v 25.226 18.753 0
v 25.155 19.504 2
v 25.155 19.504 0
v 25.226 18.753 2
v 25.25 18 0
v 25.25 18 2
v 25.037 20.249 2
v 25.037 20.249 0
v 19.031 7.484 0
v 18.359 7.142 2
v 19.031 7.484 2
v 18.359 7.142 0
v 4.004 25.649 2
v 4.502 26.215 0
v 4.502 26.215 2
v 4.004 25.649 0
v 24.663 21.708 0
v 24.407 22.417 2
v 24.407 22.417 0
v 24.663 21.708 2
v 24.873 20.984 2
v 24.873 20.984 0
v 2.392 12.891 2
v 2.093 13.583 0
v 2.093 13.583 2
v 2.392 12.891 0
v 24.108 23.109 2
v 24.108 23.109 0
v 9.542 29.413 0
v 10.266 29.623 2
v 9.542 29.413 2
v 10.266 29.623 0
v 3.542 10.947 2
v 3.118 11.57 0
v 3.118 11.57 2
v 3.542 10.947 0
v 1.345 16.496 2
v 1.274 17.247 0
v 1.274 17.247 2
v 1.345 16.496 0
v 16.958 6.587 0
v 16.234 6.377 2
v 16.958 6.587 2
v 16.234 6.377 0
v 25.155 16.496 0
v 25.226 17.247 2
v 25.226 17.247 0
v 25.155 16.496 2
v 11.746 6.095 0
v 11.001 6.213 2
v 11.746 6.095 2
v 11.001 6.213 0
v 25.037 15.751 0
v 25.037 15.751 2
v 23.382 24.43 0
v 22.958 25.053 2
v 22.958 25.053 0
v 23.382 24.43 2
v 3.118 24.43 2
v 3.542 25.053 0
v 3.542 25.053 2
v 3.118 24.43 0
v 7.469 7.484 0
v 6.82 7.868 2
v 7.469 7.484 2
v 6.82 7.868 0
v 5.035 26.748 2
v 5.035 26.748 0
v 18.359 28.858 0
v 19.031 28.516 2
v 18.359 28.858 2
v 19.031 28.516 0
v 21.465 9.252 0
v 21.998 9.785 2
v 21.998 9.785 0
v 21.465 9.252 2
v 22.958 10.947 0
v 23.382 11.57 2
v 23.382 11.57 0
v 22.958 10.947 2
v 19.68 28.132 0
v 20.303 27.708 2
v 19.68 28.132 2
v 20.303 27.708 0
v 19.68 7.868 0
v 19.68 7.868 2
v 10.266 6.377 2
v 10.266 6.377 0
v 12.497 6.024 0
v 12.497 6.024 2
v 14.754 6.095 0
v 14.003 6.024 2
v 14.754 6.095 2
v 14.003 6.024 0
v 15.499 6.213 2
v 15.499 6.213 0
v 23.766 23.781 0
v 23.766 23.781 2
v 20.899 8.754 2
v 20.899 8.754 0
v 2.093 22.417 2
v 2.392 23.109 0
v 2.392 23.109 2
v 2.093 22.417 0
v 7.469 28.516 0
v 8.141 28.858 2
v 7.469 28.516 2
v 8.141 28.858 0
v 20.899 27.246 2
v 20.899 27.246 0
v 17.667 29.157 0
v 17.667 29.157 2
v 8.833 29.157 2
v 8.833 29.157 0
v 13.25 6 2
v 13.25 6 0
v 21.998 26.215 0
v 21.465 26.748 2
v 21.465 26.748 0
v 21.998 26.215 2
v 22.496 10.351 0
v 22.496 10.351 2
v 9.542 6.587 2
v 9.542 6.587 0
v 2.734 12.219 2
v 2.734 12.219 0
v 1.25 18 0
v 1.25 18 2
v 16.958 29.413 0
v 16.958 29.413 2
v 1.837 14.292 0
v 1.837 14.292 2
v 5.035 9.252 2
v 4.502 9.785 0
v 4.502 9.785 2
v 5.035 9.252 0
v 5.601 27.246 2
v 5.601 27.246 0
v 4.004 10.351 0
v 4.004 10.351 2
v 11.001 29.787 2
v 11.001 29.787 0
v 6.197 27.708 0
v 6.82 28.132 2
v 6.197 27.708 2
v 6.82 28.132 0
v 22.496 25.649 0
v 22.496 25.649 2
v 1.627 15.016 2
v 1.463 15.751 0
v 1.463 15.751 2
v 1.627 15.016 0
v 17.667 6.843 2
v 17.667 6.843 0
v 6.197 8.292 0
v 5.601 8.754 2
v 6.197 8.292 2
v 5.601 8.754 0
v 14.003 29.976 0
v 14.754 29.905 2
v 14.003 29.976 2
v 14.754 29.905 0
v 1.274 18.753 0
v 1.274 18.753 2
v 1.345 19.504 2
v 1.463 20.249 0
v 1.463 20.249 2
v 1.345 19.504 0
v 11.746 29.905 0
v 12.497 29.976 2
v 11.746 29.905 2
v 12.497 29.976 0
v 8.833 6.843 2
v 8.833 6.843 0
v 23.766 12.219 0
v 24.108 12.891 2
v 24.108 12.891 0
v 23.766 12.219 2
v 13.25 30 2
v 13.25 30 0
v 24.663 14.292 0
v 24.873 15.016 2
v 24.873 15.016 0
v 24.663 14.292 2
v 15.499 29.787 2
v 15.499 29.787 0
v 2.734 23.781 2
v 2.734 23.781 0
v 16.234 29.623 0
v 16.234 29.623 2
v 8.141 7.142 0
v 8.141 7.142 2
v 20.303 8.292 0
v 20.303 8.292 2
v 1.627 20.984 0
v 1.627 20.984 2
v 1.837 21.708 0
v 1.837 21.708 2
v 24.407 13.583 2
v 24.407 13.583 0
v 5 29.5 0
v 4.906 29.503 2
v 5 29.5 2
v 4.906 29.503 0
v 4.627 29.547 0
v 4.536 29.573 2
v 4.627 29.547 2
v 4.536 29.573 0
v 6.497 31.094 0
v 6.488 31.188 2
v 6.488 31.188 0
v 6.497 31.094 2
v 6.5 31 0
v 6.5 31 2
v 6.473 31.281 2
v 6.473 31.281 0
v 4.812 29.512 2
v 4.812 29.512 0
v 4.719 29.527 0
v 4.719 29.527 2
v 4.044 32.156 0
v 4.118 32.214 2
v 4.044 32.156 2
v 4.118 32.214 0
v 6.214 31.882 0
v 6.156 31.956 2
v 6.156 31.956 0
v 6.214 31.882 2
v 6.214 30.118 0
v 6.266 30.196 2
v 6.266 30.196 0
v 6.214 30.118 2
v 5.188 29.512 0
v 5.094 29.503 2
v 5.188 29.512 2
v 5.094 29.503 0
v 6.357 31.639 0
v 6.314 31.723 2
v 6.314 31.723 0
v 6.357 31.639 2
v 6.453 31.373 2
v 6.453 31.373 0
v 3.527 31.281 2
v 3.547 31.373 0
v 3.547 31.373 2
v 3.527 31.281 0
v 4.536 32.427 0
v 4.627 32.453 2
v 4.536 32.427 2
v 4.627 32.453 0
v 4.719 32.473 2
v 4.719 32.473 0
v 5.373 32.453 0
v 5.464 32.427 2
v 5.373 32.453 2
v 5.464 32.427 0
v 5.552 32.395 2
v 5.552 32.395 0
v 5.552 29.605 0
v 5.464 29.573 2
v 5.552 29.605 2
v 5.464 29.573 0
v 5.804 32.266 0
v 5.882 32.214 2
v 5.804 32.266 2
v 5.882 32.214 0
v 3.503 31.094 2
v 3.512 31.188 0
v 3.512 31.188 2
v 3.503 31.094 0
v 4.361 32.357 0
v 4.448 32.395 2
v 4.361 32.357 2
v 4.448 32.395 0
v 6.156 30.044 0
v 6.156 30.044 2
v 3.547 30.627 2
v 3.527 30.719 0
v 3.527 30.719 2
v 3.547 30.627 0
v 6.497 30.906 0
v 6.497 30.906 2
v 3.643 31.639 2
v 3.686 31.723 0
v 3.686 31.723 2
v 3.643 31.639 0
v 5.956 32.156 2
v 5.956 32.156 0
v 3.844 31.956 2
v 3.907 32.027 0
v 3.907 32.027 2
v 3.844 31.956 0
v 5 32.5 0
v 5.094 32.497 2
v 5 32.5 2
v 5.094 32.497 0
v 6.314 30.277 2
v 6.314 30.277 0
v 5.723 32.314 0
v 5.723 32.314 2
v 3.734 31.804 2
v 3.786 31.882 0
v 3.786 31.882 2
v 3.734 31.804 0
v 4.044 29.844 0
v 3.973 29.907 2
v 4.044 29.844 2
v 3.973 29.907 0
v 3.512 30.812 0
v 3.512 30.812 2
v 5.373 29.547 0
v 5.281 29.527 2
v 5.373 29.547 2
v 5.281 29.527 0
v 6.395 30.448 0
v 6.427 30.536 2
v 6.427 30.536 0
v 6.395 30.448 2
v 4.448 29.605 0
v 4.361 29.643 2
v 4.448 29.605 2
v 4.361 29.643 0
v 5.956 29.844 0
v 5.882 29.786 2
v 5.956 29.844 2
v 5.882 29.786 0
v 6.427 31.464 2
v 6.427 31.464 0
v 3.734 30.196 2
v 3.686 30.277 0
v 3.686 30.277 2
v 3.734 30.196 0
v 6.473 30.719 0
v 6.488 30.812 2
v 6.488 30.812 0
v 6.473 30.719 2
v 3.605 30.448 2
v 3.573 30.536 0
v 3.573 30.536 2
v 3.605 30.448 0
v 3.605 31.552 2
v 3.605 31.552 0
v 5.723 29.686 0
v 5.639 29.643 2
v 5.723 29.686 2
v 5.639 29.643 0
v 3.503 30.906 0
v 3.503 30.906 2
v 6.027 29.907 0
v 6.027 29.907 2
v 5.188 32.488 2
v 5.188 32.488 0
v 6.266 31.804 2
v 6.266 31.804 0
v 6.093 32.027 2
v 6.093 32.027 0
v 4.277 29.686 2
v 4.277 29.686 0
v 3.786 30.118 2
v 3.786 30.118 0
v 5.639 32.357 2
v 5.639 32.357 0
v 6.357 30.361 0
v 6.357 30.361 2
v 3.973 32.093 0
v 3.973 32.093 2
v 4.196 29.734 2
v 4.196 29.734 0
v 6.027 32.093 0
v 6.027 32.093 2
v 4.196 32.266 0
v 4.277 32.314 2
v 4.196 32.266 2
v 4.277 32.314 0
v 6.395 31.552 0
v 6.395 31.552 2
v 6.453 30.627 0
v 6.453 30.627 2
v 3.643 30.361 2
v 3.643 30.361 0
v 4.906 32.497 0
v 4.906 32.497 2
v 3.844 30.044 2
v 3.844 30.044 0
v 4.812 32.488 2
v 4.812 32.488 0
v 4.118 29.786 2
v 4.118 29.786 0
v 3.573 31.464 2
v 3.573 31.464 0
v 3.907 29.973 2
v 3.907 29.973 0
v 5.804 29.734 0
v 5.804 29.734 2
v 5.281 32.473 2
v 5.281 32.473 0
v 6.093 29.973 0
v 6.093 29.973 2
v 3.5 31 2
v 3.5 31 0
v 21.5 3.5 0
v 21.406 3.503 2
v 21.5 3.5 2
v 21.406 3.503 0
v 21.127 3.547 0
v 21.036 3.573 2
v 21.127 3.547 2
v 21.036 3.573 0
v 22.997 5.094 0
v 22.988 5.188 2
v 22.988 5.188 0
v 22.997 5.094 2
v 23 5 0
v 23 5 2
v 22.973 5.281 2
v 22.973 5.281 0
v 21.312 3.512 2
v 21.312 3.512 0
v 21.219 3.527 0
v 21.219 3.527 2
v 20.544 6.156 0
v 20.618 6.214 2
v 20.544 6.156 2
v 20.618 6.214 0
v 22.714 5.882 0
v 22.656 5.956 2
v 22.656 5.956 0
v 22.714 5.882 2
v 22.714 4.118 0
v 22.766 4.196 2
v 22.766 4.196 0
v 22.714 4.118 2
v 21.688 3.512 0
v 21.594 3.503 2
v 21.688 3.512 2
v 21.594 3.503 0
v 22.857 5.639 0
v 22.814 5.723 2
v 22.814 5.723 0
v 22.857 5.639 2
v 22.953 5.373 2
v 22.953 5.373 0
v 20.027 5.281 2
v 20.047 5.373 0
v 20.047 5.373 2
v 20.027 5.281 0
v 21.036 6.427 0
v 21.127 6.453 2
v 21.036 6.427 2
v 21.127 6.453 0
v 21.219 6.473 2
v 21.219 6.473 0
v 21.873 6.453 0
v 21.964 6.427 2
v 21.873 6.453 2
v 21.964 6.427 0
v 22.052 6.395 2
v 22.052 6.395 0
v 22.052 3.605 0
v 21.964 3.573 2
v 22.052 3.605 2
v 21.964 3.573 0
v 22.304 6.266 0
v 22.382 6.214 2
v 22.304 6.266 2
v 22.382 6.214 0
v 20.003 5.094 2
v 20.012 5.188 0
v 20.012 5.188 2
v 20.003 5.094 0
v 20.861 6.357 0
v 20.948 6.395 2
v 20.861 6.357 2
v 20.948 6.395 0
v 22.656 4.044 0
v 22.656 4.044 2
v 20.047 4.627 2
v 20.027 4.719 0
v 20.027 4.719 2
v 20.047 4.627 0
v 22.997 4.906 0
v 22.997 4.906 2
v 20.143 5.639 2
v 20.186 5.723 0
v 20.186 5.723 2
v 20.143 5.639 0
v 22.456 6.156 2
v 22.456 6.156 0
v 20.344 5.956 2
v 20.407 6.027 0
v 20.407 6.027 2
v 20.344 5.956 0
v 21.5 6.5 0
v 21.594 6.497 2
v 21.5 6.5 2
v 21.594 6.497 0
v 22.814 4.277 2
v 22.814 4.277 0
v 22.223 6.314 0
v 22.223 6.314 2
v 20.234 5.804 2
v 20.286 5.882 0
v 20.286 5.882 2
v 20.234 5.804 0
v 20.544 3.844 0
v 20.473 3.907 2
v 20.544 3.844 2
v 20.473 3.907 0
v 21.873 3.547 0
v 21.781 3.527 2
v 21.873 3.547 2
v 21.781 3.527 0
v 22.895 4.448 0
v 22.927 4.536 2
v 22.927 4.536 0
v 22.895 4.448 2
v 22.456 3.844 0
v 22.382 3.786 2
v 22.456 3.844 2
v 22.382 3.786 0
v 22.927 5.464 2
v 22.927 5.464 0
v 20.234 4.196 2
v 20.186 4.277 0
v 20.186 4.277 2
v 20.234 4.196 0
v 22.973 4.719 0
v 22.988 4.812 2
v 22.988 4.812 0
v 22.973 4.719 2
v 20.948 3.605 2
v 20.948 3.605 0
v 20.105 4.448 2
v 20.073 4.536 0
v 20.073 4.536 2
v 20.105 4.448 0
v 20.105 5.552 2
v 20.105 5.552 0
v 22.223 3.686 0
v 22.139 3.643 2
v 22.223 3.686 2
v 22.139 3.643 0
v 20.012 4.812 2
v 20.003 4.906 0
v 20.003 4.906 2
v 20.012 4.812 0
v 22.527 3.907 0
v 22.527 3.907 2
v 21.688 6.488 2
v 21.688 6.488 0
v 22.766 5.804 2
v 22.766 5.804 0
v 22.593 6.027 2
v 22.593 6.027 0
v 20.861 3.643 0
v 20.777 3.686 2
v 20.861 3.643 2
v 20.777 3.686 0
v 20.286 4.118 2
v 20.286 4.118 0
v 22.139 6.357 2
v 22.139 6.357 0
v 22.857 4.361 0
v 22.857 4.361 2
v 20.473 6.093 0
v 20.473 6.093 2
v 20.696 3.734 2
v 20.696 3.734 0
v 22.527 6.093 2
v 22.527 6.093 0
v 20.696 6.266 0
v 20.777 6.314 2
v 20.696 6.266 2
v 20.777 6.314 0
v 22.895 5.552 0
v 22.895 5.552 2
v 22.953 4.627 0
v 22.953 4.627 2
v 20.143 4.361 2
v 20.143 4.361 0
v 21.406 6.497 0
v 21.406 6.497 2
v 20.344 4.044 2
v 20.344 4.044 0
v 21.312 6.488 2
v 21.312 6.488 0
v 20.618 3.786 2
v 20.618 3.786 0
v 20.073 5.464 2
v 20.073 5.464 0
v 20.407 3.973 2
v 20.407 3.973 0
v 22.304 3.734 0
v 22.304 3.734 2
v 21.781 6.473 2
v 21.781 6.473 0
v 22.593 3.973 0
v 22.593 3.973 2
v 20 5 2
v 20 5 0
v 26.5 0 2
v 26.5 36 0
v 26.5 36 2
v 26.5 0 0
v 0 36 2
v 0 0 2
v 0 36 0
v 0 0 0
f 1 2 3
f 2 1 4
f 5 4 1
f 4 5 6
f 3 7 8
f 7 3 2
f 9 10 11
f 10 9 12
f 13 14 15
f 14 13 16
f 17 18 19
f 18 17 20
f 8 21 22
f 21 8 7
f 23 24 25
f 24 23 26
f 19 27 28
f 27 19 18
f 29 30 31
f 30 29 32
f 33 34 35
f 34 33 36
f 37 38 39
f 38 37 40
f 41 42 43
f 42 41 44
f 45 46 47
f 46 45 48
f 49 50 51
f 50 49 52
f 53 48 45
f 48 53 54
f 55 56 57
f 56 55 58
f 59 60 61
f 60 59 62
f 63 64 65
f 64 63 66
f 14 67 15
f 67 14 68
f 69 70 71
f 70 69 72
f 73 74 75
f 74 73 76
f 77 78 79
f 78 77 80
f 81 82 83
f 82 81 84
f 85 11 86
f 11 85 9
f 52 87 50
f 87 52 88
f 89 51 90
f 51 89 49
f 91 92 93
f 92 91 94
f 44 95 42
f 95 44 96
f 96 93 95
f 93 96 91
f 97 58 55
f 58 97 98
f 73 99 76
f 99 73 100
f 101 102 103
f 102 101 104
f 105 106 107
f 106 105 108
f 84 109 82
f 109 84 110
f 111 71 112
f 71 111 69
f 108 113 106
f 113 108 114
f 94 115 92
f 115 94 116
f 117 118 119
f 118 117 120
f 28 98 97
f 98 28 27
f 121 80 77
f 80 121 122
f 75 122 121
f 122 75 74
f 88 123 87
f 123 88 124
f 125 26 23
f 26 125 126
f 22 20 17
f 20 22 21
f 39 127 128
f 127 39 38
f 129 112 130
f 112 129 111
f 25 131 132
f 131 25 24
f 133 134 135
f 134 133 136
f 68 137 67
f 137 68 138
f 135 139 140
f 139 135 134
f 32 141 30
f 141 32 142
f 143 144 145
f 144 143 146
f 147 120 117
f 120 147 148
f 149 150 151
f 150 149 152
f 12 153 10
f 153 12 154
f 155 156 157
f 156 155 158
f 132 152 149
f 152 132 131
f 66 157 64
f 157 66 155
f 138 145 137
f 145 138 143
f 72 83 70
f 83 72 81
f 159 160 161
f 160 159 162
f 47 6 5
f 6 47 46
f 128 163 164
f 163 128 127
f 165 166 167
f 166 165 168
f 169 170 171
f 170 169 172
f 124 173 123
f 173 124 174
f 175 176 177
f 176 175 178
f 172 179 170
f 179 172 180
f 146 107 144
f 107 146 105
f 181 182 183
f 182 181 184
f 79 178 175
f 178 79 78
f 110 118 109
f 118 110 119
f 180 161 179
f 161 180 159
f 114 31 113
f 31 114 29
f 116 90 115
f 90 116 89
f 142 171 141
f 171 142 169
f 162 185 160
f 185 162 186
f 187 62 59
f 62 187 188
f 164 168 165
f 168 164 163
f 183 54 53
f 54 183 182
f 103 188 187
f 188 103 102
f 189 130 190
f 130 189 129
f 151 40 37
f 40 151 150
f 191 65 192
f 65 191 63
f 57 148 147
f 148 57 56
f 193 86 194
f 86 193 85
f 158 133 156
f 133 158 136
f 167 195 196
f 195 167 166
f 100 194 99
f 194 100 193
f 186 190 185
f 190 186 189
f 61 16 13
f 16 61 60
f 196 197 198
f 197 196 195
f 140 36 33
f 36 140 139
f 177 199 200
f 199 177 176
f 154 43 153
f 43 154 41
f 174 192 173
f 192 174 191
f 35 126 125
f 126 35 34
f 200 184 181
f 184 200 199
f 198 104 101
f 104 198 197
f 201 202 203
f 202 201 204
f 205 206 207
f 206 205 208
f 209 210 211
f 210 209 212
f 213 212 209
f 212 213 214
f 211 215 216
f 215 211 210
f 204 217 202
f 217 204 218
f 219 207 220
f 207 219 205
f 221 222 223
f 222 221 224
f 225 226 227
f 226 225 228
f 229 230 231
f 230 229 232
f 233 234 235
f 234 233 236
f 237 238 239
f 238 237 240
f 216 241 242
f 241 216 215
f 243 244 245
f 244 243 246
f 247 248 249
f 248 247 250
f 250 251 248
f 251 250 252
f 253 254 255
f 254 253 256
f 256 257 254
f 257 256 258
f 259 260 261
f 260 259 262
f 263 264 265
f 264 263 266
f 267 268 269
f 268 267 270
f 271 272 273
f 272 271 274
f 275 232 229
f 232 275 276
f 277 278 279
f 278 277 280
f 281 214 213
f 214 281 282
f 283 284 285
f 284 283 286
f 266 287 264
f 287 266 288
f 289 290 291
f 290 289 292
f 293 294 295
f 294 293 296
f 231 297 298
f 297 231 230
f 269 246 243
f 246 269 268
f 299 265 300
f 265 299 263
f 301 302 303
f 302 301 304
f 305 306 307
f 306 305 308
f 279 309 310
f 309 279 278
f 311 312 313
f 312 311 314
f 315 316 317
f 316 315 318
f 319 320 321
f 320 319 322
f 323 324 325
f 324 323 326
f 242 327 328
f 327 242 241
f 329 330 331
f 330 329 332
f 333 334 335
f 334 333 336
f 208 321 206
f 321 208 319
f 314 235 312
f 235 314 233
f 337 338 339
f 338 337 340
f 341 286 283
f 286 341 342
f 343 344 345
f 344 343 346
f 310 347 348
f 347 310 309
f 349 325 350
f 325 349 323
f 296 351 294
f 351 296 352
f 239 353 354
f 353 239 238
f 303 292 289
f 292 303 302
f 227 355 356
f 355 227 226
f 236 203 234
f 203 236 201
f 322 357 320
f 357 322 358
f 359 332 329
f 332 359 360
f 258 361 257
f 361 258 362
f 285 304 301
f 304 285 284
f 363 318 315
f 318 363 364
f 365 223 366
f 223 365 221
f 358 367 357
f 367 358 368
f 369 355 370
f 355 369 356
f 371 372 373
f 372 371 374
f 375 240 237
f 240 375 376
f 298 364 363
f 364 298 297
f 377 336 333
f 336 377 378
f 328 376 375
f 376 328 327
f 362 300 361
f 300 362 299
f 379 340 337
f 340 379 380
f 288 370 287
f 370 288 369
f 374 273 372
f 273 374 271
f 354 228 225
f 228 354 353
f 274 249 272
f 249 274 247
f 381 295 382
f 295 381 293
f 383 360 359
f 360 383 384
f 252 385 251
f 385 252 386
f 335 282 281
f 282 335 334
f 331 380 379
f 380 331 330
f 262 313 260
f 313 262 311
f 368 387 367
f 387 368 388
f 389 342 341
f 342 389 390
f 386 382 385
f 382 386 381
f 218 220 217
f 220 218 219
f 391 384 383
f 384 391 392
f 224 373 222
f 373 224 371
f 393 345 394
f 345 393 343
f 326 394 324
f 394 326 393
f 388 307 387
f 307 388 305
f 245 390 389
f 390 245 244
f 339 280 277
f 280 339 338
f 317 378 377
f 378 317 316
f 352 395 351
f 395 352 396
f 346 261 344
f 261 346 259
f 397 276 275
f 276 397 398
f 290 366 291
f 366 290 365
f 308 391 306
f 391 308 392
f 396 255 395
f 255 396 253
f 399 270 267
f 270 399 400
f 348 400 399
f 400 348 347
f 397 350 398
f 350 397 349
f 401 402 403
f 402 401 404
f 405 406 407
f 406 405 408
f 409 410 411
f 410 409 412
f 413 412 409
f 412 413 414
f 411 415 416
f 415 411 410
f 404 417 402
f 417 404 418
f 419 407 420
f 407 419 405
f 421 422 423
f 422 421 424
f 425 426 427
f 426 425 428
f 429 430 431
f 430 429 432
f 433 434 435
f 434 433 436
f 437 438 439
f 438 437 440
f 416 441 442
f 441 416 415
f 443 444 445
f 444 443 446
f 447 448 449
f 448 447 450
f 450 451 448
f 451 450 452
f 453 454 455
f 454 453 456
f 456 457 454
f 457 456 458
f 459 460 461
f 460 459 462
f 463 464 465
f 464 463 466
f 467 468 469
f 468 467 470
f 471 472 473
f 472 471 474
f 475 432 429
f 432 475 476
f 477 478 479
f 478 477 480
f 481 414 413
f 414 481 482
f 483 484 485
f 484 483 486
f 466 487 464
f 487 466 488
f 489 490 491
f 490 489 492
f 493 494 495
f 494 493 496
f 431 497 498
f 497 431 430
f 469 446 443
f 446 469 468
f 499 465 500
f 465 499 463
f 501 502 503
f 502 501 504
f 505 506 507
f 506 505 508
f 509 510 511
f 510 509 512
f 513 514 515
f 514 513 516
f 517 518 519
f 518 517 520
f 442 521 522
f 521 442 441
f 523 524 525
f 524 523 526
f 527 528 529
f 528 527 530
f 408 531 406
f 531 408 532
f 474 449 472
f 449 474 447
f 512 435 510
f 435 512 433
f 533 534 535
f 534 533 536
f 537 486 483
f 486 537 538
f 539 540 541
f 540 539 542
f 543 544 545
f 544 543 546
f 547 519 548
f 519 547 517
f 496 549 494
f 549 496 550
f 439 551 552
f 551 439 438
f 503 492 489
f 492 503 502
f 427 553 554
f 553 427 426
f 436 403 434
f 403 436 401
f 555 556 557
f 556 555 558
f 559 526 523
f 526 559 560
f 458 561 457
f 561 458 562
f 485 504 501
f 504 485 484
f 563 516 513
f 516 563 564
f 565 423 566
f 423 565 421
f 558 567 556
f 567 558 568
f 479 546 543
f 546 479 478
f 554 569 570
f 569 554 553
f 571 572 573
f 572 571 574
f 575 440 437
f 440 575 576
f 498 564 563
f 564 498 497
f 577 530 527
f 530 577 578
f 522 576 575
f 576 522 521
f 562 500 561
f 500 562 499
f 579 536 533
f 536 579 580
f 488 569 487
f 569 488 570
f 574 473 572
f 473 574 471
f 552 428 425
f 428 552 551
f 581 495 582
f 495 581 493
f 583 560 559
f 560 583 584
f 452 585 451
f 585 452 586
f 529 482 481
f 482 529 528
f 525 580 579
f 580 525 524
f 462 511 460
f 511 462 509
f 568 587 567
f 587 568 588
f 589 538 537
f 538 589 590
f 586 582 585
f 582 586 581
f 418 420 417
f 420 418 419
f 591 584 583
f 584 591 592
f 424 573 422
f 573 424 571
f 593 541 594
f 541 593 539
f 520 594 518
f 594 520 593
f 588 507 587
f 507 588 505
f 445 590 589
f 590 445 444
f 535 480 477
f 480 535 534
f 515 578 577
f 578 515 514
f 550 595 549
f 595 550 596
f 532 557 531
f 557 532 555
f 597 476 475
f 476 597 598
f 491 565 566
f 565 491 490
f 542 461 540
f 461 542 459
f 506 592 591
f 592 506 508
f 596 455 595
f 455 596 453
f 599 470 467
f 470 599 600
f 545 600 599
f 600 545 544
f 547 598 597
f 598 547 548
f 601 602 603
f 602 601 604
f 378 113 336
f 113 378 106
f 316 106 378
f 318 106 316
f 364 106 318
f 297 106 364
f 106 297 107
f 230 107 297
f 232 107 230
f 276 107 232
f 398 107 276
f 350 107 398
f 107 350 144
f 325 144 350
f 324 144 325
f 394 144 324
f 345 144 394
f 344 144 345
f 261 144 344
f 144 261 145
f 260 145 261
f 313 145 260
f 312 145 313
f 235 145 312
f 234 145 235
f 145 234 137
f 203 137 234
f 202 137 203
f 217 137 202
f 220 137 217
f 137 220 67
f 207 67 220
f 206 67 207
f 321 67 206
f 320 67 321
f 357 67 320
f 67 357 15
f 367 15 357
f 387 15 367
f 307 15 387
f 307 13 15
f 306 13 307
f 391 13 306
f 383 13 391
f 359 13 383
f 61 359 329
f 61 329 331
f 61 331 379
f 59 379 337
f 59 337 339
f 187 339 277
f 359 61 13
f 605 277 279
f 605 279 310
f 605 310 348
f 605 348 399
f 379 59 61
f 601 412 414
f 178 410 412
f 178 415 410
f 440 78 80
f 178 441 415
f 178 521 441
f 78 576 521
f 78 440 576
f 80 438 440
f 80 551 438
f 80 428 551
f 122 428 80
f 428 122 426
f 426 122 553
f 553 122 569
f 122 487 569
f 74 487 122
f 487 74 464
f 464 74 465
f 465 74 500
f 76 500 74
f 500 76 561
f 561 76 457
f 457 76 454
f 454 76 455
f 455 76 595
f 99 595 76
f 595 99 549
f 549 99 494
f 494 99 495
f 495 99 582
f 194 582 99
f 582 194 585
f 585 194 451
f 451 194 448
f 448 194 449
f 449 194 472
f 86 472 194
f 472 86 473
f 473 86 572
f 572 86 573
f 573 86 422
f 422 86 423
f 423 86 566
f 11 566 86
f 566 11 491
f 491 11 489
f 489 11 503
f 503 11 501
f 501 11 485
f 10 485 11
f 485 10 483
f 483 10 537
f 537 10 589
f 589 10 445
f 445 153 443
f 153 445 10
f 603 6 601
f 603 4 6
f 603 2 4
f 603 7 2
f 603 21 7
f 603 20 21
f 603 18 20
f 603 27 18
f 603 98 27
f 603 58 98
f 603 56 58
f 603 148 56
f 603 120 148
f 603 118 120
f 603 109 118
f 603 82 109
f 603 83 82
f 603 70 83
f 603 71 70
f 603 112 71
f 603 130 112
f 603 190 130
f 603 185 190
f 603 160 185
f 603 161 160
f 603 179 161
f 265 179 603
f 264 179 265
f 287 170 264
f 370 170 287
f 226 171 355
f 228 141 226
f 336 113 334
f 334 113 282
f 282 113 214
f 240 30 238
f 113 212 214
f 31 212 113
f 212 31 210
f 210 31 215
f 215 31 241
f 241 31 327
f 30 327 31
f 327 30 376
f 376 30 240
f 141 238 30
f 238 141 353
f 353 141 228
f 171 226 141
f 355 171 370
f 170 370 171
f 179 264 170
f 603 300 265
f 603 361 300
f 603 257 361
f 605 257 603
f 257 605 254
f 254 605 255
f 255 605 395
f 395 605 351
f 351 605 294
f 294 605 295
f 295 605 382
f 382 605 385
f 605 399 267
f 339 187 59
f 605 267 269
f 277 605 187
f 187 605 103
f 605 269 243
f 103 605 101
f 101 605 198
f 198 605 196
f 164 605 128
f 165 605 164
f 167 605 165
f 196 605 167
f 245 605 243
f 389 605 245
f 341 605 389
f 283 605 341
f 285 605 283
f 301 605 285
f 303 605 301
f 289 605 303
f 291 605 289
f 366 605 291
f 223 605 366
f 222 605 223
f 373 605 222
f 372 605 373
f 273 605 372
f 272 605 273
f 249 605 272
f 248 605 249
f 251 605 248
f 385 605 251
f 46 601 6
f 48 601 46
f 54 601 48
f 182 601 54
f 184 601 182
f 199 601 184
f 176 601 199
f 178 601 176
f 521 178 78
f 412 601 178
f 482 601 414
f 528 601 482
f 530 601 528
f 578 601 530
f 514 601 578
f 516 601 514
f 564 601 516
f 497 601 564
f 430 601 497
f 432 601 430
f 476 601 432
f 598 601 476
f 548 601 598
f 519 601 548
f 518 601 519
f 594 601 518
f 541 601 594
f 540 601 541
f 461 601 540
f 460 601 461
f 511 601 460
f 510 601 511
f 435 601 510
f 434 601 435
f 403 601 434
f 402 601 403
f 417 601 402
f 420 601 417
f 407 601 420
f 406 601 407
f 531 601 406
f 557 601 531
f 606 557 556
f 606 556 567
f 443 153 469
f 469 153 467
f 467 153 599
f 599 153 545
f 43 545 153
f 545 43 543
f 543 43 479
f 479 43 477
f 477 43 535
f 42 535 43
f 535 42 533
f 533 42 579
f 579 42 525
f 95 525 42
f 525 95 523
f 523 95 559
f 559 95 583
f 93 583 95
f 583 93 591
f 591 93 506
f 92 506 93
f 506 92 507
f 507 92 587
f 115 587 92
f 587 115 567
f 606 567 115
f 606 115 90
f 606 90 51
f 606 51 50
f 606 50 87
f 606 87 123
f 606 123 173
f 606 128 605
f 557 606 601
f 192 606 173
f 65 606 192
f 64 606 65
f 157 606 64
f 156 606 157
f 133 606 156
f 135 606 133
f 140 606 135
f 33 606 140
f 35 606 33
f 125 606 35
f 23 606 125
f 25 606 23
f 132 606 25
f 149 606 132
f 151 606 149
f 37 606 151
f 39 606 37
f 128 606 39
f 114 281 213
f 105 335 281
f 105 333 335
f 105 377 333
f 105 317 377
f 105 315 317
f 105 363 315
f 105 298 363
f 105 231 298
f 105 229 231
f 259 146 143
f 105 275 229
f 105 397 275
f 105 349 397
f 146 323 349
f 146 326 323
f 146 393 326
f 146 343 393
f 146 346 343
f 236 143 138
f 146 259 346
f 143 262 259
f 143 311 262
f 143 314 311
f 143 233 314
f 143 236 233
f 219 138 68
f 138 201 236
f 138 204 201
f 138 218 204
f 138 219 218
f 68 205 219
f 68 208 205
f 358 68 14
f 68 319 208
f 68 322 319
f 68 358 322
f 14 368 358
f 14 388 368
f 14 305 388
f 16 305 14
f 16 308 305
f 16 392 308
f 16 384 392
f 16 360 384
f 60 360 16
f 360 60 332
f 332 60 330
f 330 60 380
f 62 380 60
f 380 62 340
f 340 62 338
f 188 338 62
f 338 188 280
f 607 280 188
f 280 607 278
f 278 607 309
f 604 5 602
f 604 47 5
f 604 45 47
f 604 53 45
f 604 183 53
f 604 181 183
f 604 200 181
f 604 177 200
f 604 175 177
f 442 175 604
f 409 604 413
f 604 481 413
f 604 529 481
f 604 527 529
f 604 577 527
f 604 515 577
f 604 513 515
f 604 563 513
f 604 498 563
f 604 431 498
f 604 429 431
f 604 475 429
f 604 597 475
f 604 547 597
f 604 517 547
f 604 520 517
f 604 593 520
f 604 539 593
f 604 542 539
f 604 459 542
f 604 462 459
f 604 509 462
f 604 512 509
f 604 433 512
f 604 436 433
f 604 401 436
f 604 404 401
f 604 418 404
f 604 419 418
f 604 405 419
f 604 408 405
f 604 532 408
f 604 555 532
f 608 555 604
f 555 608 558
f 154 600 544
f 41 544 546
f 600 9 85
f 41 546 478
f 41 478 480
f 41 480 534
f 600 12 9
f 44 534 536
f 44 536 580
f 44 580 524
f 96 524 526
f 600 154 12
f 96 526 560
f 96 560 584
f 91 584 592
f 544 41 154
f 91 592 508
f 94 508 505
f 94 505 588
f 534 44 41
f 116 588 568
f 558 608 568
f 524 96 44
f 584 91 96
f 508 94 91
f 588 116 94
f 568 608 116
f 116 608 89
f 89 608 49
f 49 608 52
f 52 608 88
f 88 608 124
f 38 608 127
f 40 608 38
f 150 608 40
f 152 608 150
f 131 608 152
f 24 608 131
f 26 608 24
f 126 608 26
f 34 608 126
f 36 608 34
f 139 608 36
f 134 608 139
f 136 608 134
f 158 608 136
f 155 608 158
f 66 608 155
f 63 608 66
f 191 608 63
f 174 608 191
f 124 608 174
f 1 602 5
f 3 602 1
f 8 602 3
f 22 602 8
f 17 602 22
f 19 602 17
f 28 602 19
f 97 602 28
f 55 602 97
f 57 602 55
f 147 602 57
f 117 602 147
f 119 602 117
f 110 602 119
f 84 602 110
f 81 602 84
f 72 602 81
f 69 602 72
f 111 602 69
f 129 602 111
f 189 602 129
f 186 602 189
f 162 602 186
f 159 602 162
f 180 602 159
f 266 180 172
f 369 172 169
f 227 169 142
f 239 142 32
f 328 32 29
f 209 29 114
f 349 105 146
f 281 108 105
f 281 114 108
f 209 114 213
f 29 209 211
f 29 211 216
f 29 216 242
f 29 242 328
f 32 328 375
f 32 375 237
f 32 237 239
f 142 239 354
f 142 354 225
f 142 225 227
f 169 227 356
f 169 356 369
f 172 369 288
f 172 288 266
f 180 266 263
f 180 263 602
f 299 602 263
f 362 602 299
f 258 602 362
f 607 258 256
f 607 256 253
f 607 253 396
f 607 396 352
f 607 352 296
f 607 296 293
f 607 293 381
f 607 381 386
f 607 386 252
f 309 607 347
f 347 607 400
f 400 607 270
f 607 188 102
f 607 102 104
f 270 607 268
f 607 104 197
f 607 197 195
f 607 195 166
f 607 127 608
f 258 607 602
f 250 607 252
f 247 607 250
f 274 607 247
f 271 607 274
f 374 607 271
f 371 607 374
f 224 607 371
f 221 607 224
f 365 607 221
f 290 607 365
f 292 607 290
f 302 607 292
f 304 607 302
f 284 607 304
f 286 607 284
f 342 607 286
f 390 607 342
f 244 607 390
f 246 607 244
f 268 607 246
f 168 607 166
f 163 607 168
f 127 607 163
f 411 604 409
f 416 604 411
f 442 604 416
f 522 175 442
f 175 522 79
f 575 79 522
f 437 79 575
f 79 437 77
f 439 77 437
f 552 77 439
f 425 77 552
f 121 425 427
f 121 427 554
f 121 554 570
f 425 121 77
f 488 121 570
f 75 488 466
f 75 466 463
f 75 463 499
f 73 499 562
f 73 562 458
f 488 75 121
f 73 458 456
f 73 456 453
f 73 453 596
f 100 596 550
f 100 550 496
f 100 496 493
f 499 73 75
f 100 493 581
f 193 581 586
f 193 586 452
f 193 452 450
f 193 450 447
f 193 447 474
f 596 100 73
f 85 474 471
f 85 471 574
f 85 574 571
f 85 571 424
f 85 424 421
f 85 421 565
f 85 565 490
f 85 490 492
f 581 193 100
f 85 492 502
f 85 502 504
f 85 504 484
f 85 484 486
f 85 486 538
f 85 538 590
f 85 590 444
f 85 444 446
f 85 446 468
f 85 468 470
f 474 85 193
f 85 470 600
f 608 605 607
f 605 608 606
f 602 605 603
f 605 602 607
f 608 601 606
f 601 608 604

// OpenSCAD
difference(){
	union(){


        translate([0,0,0]){
           cube([26.5,36,2], center=false);
        }        

        
	}
	union() {
        translate([26.5/2,36/2,-1]){
            rotate([0,0,0]){
               cylinder(h=10, r=12, $fn=100, center=false);
            }
        }
        translate([5,36-5,0-1]){
            rotate([0,0,0]){
               cylinder(h=10, r=1.5, $fn=100, center=false);
            }
        }
        translate([26.5-5,5,-1]){
            rotate([0,0,0]){
               cylinder(h=10, r=1.5, $fn=100, center=false);
            }
        }


	}
}
